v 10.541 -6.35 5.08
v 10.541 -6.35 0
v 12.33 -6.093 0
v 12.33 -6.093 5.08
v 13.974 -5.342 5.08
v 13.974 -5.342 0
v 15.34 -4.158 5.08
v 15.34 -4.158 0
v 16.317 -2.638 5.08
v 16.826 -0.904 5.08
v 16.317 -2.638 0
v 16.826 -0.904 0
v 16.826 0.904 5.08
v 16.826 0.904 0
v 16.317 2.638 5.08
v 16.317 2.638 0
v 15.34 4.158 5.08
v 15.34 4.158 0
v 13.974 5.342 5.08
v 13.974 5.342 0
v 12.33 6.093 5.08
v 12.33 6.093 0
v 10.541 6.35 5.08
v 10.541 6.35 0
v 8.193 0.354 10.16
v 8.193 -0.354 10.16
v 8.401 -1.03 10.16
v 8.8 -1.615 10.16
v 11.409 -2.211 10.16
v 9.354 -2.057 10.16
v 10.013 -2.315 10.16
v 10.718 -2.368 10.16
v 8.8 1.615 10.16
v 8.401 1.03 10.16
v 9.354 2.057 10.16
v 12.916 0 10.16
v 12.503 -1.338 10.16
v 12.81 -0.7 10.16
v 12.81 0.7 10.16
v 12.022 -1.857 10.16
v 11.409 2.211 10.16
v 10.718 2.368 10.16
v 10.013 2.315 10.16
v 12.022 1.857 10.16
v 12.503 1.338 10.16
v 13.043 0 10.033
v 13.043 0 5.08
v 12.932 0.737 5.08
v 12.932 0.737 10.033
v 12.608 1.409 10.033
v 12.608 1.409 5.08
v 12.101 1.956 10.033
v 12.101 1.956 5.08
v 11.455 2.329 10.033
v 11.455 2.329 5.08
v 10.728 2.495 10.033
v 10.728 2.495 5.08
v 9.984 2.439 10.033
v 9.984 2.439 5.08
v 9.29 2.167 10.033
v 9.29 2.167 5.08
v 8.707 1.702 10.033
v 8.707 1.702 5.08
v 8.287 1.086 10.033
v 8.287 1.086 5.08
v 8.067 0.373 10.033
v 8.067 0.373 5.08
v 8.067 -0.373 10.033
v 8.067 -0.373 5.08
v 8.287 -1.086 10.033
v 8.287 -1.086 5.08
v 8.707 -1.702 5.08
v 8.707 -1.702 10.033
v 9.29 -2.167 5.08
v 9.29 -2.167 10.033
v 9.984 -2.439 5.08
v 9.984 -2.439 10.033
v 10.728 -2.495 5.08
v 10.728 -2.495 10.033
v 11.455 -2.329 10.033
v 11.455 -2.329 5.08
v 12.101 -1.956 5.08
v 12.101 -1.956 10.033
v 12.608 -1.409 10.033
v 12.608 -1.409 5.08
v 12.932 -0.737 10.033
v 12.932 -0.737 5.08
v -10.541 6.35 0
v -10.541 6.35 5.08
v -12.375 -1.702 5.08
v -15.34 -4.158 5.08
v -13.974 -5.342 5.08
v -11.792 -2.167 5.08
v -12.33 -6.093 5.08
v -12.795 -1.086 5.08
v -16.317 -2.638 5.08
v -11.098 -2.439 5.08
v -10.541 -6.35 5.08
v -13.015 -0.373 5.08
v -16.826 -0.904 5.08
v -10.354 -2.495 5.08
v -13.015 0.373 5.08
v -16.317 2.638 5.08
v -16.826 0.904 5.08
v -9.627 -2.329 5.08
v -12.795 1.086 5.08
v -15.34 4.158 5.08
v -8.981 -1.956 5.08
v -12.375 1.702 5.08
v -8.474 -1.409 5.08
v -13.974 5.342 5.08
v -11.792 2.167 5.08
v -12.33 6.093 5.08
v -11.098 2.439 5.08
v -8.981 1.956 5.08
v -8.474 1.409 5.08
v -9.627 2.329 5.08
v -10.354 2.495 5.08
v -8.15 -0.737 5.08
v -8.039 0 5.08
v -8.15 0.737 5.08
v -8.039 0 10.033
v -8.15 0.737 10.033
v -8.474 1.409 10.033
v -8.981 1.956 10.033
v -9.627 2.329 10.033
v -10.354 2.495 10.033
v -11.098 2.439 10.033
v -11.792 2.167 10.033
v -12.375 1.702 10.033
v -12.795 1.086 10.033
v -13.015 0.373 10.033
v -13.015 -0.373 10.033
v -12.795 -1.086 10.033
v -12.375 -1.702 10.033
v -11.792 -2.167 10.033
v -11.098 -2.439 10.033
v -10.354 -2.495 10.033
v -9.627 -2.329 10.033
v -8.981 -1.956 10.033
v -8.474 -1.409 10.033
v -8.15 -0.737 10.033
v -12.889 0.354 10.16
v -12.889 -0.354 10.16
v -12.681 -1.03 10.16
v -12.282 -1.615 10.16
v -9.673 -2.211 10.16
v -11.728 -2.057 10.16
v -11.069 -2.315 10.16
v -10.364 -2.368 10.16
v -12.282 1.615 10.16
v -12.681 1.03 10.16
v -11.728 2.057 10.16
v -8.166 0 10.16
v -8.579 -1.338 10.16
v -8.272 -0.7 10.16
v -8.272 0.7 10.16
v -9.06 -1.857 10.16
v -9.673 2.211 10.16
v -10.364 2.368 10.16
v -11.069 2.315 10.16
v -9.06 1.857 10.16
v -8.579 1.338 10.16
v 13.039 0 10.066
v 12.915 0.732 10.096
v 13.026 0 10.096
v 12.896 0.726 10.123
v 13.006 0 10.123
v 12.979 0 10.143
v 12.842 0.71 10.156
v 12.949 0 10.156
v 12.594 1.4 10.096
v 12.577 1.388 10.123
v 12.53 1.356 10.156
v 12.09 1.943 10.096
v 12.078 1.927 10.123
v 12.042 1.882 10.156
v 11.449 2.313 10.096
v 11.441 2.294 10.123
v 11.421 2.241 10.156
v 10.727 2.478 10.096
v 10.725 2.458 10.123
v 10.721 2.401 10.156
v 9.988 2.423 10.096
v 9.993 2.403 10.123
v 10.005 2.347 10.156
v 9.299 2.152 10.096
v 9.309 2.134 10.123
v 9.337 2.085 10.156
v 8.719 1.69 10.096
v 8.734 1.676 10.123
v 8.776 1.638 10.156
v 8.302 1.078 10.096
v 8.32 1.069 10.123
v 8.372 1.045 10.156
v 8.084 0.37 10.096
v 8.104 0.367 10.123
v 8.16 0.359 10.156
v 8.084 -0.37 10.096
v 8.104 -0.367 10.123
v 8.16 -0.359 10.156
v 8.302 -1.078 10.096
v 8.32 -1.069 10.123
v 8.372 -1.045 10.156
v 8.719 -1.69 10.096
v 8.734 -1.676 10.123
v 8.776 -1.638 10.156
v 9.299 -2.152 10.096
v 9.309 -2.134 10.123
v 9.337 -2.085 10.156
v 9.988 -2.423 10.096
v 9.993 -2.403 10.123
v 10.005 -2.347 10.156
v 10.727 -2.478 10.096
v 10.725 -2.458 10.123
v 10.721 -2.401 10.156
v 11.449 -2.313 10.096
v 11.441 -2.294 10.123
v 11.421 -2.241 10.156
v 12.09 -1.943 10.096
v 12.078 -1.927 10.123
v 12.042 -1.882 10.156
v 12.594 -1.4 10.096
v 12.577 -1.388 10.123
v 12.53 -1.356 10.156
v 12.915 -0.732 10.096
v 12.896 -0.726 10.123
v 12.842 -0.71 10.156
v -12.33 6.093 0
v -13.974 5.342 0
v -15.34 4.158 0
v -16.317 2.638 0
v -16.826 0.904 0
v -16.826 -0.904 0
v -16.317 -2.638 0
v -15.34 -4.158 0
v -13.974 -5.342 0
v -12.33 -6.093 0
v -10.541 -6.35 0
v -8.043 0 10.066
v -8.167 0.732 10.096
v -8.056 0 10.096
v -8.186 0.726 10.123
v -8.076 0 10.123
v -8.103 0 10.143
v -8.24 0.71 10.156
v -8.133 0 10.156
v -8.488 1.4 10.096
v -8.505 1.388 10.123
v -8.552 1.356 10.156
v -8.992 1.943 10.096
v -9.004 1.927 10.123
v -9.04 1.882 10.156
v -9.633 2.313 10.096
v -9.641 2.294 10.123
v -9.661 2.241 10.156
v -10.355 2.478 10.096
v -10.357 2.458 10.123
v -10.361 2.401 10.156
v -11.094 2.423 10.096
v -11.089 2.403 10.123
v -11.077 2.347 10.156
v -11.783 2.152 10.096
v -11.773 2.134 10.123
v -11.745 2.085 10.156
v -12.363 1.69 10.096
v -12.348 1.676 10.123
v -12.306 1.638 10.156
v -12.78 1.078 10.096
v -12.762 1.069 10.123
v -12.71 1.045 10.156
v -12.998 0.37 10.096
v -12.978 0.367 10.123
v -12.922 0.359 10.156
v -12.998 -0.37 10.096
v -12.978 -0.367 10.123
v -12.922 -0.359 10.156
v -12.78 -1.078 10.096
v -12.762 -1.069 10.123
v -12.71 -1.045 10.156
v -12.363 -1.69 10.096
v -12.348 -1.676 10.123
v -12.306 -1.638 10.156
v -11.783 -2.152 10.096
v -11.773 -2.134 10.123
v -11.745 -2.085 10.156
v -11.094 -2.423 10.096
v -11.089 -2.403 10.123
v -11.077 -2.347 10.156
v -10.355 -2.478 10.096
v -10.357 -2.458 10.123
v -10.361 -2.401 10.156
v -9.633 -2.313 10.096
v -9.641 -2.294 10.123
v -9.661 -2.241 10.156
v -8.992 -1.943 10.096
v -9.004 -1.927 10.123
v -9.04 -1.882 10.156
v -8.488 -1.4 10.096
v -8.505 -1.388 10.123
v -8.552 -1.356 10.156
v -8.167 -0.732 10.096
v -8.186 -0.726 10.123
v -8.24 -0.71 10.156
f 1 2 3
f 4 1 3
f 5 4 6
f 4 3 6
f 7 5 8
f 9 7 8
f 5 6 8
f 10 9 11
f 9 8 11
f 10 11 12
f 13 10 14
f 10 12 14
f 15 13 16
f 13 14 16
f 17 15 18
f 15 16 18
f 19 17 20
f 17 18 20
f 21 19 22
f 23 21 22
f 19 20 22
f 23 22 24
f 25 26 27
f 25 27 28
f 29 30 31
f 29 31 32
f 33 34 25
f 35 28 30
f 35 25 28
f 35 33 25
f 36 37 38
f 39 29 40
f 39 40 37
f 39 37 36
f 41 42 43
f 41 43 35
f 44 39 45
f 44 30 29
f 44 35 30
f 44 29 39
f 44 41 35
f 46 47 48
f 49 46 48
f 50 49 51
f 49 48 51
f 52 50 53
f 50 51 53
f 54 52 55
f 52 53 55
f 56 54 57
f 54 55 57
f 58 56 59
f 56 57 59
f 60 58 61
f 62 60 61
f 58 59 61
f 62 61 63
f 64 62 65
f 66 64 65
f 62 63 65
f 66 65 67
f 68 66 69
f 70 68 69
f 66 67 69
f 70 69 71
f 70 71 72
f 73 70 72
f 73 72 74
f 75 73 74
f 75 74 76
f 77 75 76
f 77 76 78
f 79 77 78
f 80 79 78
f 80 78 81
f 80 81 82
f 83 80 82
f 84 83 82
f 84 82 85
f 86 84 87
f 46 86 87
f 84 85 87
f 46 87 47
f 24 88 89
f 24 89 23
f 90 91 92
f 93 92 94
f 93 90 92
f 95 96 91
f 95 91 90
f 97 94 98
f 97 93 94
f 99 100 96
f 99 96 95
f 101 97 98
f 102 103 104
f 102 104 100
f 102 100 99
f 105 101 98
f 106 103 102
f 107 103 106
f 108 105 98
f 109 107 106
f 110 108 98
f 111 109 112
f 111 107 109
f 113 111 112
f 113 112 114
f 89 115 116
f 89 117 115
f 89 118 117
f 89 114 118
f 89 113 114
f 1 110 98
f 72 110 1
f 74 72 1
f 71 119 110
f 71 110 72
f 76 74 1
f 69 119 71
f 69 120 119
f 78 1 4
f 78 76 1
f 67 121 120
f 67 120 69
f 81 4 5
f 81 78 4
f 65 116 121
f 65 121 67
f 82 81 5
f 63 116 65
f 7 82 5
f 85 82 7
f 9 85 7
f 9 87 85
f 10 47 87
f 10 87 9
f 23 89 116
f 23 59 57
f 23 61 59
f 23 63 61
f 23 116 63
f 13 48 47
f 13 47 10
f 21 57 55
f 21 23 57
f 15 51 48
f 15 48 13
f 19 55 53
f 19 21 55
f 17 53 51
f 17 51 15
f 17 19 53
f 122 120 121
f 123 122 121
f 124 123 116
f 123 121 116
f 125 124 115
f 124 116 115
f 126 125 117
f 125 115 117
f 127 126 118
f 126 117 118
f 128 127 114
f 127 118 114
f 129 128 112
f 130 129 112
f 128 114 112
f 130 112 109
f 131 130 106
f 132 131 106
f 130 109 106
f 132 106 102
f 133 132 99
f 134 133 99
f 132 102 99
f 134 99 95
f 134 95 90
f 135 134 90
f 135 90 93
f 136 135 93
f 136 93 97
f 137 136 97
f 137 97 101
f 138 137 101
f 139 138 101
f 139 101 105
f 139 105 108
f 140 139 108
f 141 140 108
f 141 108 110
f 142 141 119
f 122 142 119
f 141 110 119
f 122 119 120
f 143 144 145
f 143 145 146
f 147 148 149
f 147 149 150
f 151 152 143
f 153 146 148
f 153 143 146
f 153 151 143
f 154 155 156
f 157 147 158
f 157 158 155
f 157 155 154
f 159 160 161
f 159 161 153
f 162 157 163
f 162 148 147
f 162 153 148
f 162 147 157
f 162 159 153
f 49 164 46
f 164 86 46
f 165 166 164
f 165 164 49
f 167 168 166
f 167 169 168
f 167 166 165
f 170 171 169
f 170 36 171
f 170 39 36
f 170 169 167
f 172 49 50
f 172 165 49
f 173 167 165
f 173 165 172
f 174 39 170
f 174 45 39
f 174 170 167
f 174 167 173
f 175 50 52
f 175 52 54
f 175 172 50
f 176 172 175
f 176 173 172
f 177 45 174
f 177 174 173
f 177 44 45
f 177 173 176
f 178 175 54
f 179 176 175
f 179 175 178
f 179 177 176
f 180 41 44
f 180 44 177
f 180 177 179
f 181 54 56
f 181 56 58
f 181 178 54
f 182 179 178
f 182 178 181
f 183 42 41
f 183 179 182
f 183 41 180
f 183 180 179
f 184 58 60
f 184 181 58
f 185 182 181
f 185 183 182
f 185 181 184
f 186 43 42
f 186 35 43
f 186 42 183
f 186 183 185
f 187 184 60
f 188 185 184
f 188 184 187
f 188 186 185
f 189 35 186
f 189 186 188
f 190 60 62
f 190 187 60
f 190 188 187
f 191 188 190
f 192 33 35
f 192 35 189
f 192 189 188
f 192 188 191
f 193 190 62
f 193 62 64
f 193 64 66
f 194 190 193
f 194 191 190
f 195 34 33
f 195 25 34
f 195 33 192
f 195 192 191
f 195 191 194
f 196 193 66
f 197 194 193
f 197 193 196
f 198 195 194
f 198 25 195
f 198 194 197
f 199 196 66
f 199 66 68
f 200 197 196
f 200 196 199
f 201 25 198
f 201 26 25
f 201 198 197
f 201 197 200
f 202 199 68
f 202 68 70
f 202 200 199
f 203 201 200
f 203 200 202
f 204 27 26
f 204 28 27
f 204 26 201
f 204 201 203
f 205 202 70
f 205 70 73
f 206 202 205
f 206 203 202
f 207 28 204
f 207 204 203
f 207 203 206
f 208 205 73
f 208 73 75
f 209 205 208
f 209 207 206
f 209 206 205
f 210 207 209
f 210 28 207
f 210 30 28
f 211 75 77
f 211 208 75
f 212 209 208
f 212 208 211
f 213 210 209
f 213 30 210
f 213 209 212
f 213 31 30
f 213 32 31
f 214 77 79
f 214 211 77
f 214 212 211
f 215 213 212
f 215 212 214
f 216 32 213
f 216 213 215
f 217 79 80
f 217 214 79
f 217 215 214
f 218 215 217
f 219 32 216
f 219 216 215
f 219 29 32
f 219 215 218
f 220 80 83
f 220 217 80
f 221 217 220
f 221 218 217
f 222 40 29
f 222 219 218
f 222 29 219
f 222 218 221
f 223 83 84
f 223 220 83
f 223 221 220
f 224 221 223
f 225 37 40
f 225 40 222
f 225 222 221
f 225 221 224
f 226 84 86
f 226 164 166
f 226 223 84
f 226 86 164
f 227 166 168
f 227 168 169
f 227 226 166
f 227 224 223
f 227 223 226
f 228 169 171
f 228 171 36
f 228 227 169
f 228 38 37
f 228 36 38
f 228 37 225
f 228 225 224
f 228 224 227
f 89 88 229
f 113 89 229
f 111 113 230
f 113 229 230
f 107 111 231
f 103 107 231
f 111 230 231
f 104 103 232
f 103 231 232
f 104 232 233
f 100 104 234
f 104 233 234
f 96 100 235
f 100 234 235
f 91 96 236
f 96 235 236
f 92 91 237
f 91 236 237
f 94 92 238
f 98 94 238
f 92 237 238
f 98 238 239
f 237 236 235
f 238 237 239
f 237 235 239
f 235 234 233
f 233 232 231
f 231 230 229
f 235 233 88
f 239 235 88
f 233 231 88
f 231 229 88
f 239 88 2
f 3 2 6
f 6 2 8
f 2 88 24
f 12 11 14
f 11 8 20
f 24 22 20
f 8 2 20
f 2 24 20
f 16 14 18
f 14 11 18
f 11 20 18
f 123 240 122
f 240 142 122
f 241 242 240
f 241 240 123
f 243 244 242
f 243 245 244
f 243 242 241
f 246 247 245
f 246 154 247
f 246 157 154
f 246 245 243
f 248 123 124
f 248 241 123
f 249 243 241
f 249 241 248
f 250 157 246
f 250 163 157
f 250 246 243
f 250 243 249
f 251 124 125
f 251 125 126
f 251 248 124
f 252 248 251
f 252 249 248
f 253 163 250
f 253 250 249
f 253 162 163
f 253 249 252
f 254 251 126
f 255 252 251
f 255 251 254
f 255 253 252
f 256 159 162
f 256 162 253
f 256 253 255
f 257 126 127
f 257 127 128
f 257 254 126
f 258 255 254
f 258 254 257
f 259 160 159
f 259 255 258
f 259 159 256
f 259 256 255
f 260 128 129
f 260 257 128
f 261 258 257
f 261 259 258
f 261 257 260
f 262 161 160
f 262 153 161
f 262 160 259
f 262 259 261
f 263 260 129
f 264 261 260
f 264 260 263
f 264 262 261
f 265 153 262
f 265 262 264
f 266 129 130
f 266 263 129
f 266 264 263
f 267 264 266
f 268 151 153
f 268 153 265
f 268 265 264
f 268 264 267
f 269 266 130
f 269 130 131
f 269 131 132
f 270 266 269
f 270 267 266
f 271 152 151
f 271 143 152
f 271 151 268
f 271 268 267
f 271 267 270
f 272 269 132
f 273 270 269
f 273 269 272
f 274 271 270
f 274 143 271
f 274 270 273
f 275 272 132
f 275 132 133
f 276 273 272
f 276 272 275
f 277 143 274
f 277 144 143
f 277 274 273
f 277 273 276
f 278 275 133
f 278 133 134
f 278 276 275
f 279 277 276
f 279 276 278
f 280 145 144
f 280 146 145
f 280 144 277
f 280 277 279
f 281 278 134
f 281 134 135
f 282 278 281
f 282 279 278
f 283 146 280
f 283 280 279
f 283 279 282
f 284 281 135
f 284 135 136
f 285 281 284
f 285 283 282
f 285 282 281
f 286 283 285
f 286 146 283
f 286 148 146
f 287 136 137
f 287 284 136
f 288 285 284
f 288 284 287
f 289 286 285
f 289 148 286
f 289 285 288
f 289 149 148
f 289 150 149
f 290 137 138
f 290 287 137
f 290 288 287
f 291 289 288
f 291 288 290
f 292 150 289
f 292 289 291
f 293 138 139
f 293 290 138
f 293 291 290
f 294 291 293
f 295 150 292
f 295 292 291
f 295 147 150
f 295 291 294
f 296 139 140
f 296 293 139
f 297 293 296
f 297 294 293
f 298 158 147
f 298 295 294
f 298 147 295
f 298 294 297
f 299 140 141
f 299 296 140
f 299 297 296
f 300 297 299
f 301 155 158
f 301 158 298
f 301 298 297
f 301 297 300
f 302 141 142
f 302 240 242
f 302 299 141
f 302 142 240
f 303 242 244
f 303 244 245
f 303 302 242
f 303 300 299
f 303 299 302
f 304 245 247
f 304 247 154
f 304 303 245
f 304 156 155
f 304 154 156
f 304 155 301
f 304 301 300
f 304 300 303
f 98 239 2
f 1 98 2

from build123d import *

# Parameters (mm, degrees)
F0_W     = 21.082
F0_H     = 12.7
F1_DEPTH = 5.08
F2_R     = 2.5019
F3_DEPTH = 5.08
F4_R     = 0.127


with BuildPart() as f1:
    # F0 (on Top) → F1 (new body)
    with BuildSketch(Plane.XY):
        Rectangle(F0_W, F0_H)
        with BuildLine():
            Line((-10.541, -6.35), (-10.541, 6.35))
            ThreePointArc((-10.541, 6.35), (-16.891, 0), (-10.541, -6.35))
        make_face()
        with BuildLine():
            ThreePointArc((10.541, -6.35), (16.891, 0), (10.541, 6.35))
            Line((10.541, 6.35), (10.541, -6.35))
        make_face()
    extrude(amount=F1_DEPTH)

    # F2 (on face) → F3 (join)
    with BuildSketch(Plane.XY.offset(5.08)):
        with Locations((-10.541, 0)):
            Circle(F2_R)
        with Locations((10.541, 0)):
            Circle(F2_R)
    extrude(amount=F3_DEPTH)

    # F4
    f4_edges = [f1.edges().sort_by_distance(p)[0] for p in [
        (-13.0429, 0, 10.16),
        (8.0391, 0, 10.16),
    ]]
    fillet(f4_edges, radius=F4_R)


solid = f1.part
